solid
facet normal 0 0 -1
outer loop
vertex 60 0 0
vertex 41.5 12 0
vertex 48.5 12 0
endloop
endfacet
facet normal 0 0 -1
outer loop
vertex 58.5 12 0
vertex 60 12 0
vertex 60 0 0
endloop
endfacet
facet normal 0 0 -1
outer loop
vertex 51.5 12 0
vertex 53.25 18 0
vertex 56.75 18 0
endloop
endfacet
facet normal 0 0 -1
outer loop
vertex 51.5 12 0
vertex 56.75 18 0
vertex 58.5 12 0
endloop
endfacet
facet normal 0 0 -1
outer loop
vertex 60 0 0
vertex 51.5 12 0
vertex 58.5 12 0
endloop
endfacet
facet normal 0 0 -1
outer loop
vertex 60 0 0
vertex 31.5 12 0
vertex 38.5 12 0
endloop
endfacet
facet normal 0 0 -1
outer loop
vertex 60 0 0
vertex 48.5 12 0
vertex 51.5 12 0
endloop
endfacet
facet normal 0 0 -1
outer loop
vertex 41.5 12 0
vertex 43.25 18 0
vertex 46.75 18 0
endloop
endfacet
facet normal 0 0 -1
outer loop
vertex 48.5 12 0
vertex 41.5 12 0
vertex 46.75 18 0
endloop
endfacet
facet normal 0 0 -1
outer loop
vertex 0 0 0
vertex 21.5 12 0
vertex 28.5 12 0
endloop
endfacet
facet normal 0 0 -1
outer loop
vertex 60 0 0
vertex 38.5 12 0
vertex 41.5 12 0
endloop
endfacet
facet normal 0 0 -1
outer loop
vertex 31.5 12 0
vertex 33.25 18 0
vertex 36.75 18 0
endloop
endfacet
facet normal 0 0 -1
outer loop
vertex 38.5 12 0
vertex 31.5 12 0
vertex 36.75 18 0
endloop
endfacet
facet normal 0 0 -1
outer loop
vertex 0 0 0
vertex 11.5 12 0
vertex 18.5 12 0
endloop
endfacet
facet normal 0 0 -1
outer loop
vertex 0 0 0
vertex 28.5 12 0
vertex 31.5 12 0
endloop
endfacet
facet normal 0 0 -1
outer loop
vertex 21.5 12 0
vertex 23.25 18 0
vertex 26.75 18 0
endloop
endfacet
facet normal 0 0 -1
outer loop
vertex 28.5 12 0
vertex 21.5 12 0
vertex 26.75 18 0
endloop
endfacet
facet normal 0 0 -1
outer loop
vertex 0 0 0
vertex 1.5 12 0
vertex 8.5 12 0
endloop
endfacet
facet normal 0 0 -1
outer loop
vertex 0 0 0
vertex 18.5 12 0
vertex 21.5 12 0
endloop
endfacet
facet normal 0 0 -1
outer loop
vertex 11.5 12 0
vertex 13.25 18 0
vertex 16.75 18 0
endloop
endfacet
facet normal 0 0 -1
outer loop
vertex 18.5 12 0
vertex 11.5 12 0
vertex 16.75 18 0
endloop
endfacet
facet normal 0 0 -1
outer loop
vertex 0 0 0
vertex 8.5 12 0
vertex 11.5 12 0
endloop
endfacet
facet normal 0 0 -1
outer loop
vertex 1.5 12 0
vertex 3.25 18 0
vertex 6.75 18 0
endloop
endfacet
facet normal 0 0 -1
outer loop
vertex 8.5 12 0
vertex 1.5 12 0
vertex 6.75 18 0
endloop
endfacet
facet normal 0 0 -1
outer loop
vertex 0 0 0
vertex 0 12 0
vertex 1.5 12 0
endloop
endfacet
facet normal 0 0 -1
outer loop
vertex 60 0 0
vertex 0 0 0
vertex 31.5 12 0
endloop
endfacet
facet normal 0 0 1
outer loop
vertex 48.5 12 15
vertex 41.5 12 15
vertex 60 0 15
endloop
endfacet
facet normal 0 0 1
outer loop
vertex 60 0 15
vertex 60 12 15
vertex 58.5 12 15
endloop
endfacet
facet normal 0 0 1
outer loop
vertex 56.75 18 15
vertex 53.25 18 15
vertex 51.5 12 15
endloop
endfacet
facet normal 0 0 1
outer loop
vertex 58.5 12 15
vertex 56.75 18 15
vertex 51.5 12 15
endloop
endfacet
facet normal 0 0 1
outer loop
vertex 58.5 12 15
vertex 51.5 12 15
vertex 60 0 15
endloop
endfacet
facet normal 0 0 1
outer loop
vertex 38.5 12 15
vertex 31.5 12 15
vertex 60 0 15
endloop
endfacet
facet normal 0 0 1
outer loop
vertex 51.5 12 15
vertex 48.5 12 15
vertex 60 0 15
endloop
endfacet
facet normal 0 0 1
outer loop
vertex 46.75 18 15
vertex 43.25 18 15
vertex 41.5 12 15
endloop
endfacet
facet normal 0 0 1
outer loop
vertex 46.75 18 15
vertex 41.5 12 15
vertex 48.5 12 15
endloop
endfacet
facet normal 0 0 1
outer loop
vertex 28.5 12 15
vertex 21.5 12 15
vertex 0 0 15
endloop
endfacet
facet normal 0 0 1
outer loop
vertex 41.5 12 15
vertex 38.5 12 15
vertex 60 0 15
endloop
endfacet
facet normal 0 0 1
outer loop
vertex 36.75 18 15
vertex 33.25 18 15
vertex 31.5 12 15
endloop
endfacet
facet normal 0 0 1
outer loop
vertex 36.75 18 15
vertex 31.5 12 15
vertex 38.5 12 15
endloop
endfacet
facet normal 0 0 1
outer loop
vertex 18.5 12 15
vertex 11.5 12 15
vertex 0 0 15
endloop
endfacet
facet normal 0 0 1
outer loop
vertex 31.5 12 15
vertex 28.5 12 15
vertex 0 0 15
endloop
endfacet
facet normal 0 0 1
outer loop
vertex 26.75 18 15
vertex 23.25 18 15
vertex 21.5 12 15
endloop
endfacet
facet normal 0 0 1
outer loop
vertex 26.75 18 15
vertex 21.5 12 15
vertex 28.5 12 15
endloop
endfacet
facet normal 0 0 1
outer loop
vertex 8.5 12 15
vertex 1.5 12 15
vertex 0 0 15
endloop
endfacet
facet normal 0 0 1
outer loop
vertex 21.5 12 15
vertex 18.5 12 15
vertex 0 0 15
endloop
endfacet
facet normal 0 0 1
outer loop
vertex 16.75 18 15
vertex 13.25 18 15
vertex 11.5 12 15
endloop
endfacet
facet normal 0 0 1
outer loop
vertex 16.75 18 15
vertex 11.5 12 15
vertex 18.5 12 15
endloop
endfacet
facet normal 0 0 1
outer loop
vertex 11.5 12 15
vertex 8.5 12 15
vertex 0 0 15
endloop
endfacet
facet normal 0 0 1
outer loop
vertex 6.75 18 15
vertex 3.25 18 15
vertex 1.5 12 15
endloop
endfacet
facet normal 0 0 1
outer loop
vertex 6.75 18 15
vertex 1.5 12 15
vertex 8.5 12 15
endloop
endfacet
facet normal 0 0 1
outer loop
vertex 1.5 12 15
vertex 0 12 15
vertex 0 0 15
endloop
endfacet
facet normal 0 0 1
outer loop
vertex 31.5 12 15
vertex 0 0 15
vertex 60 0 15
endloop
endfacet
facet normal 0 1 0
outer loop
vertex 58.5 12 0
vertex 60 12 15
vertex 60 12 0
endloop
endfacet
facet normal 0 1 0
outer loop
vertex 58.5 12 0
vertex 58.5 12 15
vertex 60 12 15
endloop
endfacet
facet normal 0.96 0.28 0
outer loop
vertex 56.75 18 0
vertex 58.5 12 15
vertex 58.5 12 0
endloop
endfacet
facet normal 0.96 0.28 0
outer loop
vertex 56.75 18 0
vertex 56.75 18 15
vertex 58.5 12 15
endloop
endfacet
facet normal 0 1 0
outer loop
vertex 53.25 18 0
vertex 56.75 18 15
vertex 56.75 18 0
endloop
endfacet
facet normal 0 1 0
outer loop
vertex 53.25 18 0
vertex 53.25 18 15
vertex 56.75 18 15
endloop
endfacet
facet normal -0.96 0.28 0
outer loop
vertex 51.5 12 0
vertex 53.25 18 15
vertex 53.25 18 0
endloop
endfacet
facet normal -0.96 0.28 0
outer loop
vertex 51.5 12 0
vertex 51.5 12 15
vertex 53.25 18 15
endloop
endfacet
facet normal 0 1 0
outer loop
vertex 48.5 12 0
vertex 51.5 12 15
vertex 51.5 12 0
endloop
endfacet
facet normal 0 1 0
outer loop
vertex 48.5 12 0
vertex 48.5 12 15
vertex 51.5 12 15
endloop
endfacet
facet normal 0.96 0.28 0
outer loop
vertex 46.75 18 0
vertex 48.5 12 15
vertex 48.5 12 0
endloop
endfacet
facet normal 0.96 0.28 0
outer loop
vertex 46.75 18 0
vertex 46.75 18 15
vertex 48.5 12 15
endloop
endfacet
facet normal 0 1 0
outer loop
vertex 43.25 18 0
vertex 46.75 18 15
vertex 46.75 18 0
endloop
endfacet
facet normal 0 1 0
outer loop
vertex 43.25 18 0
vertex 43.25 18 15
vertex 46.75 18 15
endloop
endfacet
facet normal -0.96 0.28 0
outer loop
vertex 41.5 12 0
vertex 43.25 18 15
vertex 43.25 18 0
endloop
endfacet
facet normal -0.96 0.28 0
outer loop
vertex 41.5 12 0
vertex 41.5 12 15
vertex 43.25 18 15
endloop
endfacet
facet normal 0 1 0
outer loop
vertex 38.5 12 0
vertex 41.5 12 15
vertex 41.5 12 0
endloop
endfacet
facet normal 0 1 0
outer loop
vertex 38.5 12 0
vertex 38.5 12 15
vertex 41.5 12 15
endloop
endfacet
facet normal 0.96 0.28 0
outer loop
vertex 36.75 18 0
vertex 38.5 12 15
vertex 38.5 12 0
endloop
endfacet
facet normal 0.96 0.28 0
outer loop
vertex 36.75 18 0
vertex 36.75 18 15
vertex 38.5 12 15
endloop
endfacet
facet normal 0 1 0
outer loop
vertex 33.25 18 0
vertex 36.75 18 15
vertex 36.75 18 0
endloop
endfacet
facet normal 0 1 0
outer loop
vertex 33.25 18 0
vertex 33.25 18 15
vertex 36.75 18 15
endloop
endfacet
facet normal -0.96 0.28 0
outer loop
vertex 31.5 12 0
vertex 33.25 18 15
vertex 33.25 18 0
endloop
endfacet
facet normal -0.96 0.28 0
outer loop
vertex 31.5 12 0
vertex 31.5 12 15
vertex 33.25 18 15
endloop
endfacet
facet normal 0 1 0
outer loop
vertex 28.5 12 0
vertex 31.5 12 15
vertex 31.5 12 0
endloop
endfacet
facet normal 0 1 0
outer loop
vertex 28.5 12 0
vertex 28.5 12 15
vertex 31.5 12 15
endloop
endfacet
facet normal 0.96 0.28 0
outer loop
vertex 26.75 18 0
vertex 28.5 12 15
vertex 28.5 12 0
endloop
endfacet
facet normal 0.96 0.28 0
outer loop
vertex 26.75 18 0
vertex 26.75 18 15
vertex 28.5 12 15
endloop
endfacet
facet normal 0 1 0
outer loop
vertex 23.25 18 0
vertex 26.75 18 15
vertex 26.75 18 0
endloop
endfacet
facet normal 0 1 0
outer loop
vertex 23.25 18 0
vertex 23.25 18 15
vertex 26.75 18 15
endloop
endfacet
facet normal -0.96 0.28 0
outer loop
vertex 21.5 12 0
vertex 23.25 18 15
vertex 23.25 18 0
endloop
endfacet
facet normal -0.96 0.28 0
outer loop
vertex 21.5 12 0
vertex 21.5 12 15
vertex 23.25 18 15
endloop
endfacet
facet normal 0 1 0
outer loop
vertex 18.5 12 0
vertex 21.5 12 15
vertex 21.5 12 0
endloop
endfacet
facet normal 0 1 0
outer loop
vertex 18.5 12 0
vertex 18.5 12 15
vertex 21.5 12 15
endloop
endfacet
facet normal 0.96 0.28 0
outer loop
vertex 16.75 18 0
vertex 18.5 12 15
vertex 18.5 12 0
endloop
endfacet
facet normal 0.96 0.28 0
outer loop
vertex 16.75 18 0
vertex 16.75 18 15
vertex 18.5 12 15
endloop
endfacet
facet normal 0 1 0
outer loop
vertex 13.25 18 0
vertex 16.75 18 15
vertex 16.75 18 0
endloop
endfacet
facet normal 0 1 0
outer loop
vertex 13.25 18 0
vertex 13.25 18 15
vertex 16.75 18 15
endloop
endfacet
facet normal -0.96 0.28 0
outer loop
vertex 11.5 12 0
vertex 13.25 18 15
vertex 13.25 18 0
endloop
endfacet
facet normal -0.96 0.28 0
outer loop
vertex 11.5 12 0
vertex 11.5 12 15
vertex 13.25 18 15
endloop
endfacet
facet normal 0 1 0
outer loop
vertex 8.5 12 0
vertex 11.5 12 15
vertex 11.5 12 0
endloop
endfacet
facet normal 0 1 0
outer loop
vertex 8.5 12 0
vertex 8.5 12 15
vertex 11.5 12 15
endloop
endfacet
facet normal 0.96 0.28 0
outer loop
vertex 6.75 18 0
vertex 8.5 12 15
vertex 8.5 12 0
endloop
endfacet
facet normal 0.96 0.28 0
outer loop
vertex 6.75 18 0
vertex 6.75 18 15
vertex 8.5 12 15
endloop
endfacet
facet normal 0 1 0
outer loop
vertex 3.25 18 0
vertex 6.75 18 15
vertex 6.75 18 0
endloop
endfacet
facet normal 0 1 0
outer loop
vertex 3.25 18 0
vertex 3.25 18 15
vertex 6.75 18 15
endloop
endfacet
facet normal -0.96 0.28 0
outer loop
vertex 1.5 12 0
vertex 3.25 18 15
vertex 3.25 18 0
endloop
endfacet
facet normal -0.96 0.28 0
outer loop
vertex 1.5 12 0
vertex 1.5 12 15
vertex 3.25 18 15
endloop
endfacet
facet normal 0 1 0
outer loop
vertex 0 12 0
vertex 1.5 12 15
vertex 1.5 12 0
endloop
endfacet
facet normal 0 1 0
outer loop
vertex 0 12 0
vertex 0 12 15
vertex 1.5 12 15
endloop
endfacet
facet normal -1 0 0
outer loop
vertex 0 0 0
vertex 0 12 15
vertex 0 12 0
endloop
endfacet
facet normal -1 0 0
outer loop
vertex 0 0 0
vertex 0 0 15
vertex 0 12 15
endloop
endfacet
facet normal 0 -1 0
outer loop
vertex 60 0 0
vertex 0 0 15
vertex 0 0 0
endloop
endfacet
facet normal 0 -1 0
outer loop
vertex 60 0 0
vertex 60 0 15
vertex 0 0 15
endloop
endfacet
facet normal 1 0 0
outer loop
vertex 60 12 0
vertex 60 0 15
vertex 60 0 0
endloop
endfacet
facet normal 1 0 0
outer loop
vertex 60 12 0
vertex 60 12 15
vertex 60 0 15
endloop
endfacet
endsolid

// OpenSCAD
$fn = 32;

// ----------------------------------------------------------------------
// Gear rack: 6 teeth, pitch 10 mm
// ----------------------------------------------------------------------

// --- parameters (mm) ---
teeth = 6;                // number of teeth
pitch = 10;               // tooth pitch, X
root_w = 7;               // tooth width at the root
tip_w = 3.5;              // tooth width at the tip
base_h = 12;              // rack body height, Y
tooth_h = 6;              // tooth height above the body
plate_t = 15;             // rack width, Z (extrusion height)

rack_l = teeth * pitch;  // overall length
total_h = base_h + tooth_h;  // overall height

profile = [[0, 0], [60, 0], [60, 12], [58.5, 12], [56.75, 18], [53.25, 18], [51.5, 12], [48.5, 12], [46.75, 18], [43.25, 18], [41.5, 12], [38.5, 12], [36.75, 18], [33.25, 18], [31.5, 12], [28.5, 12], [26.75, 18], [23.25, 18], [21.5, 12], [18.5, 12], [16.75, 18], [13.25, 18], [11.5, 12], [8.5, 12], [6.75, 18], [3.25, 18], [1.5, 12], [0, 12]];  // primary outline, 28 points, counter clockwise

// --- the one profile operation ---
linear_extrude(height = plate_t) polygon(points = profile);
